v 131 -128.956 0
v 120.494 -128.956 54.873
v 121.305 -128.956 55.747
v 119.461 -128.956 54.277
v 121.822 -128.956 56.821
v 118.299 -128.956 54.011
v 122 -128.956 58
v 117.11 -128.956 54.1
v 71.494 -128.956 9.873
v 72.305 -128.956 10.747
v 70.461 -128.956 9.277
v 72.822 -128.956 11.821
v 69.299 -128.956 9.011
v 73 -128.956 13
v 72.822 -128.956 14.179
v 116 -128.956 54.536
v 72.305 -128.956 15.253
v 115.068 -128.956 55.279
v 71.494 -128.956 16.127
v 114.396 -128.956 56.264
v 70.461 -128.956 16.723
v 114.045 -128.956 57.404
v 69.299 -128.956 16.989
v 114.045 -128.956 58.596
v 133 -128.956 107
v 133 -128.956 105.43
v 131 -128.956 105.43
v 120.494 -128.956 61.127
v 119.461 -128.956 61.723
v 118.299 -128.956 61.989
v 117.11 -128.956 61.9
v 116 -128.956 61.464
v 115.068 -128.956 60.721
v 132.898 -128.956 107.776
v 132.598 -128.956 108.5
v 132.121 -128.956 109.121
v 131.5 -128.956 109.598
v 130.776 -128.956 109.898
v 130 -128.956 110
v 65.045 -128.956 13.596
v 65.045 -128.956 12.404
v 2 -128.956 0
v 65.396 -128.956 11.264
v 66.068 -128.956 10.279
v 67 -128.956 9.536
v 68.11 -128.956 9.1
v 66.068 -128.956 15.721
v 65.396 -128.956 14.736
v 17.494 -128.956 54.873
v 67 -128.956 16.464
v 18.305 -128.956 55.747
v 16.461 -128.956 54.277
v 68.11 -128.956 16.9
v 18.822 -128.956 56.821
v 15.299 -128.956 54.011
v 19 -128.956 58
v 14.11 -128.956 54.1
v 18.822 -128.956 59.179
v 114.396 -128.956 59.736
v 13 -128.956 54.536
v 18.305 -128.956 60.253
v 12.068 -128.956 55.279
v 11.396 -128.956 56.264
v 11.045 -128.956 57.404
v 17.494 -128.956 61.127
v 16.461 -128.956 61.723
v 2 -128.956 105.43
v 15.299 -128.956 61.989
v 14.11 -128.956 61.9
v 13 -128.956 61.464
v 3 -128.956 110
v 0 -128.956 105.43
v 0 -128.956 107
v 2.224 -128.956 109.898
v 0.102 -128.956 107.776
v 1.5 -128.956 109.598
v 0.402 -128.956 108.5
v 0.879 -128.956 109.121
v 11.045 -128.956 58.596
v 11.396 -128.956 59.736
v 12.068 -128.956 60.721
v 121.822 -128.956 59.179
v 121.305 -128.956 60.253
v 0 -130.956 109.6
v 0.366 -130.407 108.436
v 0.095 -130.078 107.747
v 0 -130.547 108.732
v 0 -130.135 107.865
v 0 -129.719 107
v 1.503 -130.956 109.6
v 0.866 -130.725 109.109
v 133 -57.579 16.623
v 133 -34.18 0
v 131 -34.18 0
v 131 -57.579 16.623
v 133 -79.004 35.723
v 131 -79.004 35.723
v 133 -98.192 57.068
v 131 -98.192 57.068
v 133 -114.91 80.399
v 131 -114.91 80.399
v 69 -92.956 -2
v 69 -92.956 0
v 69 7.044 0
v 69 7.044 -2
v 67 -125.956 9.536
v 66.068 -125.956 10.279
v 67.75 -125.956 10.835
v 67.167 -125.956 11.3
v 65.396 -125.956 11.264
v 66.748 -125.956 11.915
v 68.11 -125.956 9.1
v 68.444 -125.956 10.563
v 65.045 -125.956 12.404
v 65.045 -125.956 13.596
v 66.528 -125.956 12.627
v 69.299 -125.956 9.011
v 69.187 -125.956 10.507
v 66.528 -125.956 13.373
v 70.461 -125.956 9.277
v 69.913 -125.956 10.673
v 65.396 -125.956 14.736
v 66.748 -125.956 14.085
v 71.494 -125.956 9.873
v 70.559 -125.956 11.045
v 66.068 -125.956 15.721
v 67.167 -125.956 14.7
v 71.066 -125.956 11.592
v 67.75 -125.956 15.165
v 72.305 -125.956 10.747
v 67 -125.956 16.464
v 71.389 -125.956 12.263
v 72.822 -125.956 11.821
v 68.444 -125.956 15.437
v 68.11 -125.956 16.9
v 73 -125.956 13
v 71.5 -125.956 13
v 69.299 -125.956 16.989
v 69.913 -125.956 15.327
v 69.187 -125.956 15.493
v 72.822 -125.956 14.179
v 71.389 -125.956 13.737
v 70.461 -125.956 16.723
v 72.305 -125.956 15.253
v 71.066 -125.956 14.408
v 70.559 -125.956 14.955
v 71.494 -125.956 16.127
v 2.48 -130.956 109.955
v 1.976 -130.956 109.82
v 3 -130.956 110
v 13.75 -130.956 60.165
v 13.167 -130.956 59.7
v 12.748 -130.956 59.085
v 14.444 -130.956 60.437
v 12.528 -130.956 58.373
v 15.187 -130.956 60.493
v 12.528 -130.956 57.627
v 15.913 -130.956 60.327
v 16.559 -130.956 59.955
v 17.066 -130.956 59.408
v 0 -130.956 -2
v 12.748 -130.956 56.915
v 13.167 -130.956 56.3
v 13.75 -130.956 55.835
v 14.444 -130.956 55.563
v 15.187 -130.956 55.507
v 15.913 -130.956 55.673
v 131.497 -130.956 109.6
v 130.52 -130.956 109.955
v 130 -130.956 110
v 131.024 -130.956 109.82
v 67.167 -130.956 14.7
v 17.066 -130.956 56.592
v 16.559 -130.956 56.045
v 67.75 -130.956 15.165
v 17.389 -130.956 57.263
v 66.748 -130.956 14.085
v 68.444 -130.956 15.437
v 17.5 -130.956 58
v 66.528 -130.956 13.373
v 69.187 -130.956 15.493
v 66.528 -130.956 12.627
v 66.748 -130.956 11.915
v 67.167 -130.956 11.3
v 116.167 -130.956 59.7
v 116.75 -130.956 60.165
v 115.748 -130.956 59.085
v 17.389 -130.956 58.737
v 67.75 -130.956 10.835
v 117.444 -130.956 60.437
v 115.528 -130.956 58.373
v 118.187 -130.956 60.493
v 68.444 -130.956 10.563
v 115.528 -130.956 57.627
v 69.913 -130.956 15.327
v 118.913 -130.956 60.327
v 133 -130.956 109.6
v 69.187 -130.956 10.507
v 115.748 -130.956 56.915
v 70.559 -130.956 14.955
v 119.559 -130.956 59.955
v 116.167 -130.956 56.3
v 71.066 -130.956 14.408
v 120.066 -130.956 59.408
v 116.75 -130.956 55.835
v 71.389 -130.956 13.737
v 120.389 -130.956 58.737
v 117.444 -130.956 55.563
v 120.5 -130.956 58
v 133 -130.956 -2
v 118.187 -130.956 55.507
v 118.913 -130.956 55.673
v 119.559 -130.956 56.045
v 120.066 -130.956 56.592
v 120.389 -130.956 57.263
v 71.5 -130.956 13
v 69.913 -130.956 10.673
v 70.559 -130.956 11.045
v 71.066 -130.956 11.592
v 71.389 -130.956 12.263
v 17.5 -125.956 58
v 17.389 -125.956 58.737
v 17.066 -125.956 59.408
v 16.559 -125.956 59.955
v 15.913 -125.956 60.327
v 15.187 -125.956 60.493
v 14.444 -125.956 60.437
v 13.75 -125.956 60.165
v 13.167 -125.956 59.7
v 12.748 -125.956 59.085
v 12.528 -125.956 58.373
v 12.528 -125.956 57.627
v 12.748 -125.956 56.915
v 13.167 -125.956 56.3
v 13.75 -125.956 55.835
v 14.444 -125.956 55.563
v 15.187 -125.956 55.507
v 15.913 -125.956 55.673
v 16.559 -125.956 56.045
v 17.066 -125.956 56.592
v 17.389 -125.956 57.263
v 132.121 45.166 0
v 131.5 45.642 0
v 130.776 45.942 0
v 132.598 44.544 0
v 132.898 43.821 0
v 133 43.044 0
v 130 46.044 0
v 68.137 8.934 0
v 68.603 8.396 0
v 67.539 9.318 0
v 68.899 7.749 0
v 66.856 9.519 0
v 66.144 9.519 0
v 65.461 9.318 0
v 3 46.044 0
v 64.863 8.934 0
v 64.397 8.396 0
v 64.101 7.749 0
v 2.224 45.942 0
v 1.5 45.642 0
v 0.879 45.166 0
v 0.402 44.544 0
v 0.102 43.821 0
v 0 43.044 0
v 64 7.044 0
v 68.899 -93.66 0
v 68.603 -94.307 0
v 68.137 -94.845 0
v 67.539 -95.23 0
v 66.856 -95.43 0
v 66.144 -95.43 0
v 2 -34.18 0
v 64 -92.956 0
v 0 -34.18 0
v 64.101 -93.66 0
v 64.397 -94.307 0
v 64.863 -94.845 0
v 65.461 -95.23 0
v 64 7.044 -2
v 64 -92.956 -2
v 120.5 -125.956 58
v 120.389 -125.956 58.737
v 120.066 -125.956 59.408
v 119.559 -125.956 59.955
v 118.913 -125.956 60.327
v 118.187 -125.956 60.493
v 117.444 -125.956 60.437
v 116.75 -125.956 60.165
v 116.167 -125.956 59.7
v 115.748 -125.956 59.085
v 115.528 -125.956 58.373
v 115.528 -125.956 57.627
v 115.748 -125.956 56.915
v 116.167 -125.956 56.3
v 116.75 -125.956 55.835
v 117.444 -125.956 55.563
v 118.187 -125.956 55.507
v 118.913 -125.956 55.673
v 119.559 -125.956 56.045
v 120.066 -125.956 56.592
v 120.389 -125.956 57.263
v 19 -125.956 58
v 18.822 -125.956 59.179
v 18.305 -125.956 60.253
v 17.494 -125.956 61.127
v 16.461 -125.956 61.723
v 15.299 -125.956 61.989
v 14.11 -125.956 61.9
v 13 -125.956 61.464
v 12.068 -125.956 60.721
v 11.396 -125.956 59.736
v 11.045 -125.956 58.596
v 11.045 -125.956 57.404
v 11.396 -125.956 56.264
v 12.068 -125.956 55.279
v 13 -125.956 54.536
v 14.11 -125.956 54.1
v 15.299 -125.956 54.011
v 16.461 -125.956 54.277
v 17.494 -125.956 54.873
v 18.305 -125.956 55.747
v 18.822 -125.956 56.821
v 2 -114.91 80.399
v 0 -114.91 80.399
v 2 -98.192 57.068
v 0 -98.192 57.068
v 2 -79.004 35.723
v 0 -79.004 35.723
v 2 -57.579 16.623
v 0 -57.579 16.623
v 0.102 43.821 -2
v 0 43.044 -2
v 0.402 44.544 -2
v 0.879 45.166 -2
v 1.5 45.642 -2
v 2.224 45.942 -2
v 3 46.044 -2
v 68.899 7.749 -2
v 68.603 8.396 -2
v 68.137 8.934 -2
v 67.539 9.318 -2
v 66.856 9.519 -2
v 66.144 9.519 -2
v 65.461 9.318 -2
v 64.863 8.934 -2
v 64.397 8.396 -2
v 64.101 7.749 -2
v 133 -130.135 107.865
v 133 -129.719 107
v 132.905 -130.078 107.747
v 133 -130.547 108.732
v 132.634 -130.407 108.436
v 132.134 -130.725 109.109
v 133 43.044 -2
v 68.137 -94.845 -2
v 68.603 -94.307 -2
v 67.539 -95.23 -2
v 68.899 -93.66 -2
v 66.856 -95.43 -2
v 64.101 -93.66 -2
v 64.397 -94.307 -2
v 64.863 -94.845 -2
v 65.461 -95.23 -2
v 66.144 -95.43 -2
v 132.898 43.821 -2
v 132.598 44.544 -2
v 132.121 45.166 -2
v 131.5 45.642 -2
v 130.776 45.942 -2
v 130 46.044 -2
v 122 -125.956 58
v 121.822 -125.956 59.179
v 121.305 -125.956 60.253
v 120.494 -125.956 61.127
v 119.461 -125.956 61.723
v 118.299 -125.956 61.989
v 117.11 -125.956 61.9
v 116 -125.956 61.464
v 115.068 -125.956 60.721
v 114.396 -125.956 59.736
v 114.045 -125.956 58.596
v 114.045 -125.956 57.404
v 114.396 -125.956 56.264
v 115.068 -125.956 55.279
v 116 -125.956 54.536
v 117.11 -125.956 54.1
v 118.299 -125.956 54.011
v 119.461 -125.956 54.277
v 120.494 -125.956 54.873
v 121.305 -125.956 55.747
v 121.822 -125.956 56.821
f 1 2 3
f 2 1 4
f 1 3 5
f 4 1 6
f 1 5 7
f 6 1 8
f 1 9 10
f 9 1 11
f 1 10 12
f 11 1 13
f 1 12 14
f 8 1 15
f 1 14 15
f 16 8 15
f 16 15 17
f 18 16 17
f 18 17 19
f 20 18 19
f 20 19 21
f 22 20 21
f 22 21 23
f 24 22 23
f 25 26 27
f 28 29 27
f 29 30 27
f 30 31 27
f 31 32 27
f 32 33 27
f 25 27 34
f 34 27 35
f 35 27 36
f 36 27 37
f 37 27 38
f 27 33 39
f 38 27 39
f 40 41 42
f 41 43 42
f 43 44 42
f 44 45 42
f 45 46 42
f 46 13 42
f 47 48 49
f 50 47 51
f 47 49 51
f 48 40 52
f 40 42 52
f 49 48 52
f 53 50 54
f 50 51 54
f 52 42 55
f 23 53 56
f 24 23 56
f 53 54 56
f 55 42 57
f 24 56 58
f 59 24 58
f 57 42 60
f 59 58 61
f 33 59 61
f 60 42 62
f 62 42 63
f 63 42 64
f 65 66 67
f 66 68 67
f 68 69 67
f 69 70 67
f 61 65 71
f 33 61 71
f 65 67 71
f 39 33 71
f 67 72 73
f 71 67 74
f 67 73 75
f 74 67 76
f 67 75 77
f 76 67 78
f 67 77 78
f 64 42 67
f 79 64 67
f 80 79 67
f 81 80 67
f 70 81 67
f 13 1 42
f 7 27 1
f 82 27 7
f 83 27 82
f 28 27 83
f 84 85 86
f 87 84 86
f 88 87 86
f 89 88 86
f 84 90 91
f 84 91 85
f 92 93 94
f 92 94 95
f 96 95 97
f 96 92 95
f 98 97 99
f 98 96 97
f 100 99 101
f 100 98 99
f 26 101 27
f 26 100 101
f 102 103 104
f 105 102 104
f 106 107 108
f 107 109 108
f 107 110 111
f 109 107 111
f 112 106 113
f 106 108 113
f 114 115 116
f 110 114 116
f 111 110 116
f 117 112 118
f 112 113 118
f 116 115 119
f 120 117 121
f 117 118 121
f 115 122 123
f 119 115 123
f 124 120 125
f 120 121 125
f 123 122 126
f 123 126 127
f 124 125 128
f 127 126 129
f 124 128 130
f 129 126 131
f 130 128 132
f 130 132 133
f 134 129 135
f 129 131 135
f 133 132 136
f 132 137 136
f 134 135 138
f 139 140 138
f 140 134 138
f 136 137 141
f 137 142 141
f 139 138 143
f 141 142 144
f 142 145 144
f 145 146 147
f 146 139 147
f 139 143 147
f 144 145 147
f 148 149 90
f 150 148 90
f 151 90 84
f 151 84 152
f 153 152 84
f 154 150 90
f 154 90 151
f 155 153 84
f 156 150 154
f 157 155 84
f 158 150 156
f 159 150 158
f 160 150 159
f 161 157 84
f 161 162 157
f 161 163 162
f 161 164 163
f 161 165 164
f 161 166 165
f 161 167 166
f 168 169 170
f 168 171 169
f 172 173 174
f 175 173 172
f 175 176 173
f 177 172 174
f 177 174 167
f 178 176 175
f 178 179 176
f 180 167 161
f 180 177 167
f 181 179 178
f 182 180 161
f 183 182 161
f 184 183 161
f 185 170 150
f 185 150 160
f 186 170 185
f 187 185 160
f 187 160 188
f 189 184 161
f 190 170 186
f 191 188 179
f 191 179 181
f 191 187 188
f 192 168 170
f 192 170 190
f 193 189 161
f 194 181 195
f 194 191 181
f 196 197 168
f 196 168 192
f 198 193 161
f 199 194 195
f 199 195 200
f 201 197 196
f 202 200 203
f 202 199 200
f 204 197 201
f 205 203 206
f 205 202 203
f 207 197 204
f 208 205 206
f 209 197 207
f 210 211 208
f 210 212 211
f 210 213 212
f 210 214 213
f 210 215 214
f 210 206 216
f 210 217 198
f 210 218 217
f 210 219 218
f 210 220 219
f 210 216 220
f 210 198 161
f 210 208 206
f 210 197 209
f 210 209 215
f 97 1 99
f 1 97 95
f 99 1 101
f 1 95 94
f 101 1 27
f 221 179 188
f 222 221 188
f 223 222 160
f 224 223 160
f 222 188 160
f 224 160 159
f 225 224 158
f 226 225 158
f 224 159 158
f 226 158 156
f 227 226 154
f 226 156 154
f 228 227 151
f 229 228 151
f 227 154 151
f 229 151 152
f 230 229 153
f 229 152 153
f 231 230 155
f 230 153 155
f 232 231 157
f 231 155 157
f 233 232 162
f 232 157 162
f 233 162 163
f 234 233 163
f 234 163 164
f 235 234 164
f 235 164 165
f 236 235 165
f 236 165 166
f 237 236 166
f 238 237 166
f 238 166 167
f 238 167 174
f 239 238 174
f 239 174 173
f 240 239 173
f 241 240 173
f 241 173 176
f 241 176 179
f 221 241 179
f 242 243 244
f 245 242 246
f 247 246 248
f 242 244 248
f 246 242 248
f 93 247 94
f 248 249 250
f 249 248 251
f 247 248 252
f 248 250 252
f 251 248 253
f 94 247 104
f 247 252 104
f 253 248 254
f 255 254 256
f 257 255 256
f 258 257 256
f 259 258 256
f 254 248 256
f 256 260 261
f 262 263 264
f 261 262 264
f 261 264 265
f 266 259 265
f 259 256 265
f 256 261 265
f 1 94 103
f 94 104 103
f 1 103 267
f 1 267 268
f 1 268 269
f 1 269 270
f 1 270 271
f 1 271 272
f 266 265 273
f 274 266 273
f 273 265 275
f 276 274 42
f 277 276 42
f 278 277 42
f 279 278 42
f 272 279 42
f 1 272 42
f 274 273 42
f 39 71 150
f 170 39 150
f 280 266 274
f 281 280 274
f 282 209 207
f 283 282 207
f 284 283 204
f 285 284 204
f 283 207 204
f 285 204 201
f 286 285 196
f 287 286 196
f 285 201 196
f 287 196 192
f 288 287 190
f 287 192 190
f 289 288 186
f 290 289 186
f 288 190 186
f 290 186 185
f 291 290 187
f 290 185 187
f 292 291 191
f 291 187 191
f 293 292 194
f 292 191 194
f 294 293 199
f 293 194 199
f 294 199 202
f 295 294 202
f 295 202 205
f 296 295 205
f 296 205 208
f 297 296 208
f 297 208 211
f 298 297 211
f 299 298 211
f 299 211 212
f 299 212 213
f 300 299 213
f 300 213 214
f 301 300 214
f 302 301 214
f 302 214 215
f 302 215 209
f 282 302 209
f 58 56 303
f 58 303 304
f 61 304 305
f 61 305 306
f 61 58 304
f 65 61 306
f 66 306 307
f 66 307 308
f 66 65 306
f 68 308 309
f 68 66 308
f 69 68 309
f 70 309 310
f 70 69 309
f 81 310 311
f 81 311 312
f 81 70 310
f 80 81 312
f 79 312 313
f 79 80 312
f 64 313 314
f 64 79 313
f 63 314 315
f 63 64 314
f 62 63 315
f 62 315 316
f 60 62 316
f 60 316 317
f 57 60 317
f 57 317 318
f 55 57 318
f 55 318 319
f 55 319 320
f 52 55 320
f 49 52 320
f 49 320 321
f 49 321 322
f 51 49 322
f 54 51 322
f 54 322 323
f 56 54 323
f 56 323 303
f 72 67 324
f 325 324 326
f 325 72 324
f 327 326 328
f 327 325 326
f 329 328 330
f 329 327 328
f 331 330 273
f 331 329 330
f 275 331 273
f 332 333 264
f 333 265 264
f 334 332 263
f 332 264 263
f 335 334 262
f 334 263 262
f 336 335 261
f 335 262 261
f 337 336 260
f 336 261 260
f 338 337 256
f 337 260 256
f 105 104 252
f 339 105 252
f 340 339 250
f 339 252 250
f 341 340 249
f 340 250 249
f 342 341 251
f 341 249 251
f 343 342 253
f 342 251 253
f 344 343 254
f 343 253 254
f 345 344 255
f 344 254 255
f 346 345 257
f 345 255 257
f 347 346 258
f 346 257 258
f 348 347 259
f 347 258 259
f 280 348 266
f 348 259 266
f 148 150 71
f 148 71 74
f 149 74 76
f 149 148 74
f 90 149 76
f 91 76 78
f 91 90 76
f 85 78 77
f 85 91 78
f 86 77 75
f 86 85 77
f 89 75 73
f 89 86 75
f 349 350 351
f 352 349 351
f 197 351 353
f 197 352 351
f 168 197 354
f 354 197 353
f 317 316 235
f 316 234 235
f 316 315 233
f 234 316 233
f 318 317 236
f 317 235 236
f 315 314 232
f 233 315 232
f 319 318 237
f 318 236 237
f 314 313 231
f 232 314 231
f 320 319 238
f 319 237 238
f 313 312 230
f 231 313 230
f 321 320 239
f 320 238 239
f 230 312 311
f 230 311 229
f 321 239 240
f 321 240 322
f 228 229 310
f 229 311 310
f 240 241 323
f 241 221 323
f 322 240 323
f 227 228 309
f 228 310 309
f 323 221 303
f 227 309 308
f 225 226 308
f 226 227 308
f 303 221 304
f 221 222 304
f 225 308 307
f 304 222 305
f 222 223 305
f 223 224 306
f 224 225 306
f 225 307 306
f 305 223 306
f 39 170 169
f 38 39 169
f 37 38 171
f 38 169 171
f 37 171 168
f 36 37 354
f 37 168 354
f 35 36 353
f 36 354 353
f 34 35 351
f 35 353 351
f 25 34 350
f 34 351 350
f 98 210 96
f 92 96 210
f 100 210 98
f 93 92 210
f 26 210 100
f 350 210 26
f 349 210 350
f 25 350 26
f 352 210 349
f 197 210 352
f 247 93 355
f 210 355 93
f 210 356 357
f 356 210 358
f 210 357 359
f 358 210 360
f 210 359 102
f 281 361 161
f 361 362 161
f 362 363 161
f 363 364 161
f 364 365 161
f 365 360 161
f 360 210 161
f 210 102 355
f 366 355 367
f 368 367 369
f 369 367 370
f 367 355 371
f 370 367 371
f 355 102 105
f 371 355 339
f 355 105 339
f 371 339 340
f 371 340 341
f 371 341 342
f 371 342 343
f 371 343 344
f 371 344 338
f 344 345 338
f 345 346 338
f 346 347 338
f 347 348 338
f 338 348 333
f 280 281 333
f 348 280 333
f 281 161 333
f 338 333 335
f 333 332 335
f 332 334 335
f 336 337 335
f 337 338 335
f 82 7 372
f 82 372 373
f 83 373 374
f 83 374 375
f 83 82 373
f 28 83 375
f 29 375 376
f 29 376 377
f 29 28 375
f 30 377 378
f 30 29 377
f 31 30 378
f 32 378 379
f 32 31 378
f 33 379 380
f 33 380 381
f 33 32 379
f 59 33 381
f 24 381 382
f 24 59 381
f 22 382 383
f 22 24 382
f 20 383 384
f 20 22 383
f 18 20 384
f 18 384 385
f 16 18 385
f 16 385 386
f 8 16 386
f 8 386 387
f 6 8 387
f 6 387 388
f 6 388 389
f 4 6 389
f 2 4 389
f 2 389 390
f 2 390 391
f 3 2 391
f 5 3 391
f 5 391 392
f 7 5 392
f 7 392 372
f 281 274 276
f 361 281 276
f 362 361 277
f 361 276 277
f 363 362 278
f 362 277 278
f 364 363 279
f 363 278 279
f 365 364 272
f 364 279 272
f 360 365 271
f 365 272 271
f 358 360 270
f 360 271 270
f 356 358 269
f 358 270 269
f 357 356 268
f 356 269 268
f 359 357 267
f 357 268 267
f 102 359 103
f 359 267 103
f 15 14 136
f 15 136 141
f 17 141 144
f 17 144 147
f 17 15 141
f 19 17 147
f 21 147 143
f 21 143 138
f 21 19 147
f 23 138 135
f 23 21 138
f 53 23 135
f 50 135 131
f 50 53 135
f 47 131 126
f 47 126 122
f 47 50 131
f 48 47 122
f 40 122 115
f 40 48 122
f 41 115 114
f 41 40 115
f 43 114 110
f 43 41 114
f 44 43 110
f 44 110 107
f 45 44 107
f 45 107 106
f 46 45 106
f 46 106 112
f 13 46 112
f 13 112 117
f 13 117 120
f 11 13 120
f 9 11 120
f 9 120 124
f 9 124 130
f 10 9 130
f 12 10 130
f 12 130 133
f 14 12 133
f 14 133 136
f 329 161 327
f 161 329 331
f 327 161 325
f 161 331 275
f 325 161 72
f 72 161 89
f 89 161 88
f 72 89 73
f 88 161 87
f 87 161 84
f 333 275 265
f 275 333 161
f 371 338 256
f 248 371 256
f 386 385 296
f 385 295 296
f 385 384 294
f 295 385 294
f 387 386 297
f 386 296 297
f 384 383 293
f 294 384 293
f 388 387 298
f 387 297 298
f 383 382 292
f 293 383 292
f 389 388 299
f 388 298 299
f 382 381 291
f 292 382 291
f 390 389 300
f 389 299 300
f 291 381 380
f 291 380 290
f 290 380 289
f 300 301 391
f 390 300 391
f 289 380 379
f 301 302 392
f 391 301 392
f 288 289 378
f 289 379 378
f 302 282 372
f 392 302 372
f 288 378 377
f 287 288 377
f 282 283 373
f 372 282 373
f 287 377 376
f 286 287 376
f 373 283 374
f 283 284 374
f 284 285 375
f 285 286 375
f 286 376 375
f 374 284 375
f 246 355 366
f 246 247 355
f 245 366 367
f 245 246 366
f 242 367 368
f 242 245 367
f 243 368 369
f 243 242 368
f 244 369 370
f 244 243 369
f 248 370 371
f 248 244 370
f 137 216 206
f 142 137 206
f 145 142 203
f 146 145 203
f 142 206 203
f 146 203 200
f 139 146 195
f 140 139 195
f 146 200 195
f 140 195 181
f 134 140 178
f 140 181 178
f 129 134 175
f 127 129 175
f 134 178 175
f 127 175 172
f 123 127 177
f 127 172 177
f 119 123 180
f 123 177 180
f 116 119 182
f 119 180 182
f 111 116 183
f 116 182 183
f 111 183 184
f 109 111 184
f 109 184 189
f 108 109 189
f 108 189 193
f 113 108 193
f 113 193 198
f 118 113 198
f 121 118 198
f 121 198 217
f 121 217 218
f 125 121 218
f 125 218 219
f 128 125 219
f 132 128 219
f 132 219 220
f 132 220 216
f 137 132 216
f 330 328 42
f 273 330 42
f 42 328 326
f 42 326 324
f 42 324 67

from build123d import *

# Parameters (mm, degrees)
F1_DEPTH  = 133
F2_R      = 2.5
F3_DEPTH  = 25
F4_R      = 4
F5_DEPTH  = 5
F6_DEPTH  = 25
F7_R      = 3
F9_DEPTH  = 25
F11_DEPTH = 2
F13_DEPTH = 2


with BuildPart() as f1:
    # F0 (on Right) → F1 (new body)
    with BuildSketch(Plane.YZ):
        Polygon((-128.955605, 0), (-128.955605, 110), (-130.955605, 110), (-130.955605, 0), (-130.955605, -2), (46.044395, -2), (46.044395, 0), align=None)
    extrude(amount=F1_DEPTH)

    # F2 (on face) → F3 (cut)
    with BuildSketch(Plane.XZ.offset(130.955605)):
        with Locations((69, 13)):
            Circle(F2_R)
        with Locations((15, 58)):
            Circle(F2_R)
        with Locations((118, 58)):
            Circle(F2_R)
    extrude(amount=-F3_DEPTH, mode=Mode.SUBTRACT)

    # F4 (on face) → F5 (join)
    with BuildSketch(Plane.XZ.offset(130.955605)):
        with Locations((15, 58)):
            Circle(F4_R)
        with Locations((69, 13)):
            Circle(F4_R)
        with Locations((118, 58)):
            Circle(F4_R)
    extrude(amount=-F5_DEPTH)

    # F2 (on face) → F6 (cut)
    with BuildSketch(Plane.XZ.offset(130.955605)):
        with Locations((69, 13)):
            Circle(F2_R)
        with Locations((15, 58)):
            Circle(F2_R)
        with Locations((118, 58)):
            Circle(F2_R)
    extrude(amount=-F6_DEPTH, mode=Mode.SUBTRACT)

    # F7
    f7_edges = [f1.edges().sort_by_distance(p)[0] for p in [
        (0, -129.955605, 110),
        (133, -129.955605, 110),
        (133, 46.044395, -1),
        (0, 46.044395, -1),
    ]]
    fillet(f7_edges, radius=F7_R)

    # F8 (on face) → F9 (cut)
    with BuildSketch(Plane.XY):
        with BuildLine():
            Line((64, 7.044395), (64, -92.955605))
            ThreePointArc((64, -92.955605), (66.5, -95.455605), (69, -92.955605))
            Line((69, -92.955605), (69, 7.044395))
            ThreePointArc((69, 7.044395), (66.5, 9.544395), (64, 7.044395))
        make_face()
    extrude(amount=-F9_DEPTH, mode=Mode.SUBTRACT)

    # F10 (on face) → F11 (join)
    with BuildSketch(Plane.YZ.offset(133)):
        with BuildLine():
            Line((-130.955605, 109.6), (-130.955605, -2))
            Line((-130.955605, -2), (-30.955605, -2))
            ThreePointArc((-30.955605, -2), (-89.169777, 46.439631), (-130.955605, 109.6))
        make_face()
    extrude(amount=-F11_DEPTH)

    # F12 (on face) → F13 (join)
    with BuildSketch(Plane(origin=(0, 0, 0), x_dir=(0, -1, 0), z_dir=(-1, 0, 0))):
        with BuildLine():
            Line((30.955605, -2), (130.955605, -2))
            Line((130.955605, -2), (130.955605, 109.6))
            ThreePointArc((130.955605, 109.6), (89.169777, 46.439631), (30.955605, -2))
        make_face()
    extrude(amount=-F13_DEPTH)


solid = f1.part
